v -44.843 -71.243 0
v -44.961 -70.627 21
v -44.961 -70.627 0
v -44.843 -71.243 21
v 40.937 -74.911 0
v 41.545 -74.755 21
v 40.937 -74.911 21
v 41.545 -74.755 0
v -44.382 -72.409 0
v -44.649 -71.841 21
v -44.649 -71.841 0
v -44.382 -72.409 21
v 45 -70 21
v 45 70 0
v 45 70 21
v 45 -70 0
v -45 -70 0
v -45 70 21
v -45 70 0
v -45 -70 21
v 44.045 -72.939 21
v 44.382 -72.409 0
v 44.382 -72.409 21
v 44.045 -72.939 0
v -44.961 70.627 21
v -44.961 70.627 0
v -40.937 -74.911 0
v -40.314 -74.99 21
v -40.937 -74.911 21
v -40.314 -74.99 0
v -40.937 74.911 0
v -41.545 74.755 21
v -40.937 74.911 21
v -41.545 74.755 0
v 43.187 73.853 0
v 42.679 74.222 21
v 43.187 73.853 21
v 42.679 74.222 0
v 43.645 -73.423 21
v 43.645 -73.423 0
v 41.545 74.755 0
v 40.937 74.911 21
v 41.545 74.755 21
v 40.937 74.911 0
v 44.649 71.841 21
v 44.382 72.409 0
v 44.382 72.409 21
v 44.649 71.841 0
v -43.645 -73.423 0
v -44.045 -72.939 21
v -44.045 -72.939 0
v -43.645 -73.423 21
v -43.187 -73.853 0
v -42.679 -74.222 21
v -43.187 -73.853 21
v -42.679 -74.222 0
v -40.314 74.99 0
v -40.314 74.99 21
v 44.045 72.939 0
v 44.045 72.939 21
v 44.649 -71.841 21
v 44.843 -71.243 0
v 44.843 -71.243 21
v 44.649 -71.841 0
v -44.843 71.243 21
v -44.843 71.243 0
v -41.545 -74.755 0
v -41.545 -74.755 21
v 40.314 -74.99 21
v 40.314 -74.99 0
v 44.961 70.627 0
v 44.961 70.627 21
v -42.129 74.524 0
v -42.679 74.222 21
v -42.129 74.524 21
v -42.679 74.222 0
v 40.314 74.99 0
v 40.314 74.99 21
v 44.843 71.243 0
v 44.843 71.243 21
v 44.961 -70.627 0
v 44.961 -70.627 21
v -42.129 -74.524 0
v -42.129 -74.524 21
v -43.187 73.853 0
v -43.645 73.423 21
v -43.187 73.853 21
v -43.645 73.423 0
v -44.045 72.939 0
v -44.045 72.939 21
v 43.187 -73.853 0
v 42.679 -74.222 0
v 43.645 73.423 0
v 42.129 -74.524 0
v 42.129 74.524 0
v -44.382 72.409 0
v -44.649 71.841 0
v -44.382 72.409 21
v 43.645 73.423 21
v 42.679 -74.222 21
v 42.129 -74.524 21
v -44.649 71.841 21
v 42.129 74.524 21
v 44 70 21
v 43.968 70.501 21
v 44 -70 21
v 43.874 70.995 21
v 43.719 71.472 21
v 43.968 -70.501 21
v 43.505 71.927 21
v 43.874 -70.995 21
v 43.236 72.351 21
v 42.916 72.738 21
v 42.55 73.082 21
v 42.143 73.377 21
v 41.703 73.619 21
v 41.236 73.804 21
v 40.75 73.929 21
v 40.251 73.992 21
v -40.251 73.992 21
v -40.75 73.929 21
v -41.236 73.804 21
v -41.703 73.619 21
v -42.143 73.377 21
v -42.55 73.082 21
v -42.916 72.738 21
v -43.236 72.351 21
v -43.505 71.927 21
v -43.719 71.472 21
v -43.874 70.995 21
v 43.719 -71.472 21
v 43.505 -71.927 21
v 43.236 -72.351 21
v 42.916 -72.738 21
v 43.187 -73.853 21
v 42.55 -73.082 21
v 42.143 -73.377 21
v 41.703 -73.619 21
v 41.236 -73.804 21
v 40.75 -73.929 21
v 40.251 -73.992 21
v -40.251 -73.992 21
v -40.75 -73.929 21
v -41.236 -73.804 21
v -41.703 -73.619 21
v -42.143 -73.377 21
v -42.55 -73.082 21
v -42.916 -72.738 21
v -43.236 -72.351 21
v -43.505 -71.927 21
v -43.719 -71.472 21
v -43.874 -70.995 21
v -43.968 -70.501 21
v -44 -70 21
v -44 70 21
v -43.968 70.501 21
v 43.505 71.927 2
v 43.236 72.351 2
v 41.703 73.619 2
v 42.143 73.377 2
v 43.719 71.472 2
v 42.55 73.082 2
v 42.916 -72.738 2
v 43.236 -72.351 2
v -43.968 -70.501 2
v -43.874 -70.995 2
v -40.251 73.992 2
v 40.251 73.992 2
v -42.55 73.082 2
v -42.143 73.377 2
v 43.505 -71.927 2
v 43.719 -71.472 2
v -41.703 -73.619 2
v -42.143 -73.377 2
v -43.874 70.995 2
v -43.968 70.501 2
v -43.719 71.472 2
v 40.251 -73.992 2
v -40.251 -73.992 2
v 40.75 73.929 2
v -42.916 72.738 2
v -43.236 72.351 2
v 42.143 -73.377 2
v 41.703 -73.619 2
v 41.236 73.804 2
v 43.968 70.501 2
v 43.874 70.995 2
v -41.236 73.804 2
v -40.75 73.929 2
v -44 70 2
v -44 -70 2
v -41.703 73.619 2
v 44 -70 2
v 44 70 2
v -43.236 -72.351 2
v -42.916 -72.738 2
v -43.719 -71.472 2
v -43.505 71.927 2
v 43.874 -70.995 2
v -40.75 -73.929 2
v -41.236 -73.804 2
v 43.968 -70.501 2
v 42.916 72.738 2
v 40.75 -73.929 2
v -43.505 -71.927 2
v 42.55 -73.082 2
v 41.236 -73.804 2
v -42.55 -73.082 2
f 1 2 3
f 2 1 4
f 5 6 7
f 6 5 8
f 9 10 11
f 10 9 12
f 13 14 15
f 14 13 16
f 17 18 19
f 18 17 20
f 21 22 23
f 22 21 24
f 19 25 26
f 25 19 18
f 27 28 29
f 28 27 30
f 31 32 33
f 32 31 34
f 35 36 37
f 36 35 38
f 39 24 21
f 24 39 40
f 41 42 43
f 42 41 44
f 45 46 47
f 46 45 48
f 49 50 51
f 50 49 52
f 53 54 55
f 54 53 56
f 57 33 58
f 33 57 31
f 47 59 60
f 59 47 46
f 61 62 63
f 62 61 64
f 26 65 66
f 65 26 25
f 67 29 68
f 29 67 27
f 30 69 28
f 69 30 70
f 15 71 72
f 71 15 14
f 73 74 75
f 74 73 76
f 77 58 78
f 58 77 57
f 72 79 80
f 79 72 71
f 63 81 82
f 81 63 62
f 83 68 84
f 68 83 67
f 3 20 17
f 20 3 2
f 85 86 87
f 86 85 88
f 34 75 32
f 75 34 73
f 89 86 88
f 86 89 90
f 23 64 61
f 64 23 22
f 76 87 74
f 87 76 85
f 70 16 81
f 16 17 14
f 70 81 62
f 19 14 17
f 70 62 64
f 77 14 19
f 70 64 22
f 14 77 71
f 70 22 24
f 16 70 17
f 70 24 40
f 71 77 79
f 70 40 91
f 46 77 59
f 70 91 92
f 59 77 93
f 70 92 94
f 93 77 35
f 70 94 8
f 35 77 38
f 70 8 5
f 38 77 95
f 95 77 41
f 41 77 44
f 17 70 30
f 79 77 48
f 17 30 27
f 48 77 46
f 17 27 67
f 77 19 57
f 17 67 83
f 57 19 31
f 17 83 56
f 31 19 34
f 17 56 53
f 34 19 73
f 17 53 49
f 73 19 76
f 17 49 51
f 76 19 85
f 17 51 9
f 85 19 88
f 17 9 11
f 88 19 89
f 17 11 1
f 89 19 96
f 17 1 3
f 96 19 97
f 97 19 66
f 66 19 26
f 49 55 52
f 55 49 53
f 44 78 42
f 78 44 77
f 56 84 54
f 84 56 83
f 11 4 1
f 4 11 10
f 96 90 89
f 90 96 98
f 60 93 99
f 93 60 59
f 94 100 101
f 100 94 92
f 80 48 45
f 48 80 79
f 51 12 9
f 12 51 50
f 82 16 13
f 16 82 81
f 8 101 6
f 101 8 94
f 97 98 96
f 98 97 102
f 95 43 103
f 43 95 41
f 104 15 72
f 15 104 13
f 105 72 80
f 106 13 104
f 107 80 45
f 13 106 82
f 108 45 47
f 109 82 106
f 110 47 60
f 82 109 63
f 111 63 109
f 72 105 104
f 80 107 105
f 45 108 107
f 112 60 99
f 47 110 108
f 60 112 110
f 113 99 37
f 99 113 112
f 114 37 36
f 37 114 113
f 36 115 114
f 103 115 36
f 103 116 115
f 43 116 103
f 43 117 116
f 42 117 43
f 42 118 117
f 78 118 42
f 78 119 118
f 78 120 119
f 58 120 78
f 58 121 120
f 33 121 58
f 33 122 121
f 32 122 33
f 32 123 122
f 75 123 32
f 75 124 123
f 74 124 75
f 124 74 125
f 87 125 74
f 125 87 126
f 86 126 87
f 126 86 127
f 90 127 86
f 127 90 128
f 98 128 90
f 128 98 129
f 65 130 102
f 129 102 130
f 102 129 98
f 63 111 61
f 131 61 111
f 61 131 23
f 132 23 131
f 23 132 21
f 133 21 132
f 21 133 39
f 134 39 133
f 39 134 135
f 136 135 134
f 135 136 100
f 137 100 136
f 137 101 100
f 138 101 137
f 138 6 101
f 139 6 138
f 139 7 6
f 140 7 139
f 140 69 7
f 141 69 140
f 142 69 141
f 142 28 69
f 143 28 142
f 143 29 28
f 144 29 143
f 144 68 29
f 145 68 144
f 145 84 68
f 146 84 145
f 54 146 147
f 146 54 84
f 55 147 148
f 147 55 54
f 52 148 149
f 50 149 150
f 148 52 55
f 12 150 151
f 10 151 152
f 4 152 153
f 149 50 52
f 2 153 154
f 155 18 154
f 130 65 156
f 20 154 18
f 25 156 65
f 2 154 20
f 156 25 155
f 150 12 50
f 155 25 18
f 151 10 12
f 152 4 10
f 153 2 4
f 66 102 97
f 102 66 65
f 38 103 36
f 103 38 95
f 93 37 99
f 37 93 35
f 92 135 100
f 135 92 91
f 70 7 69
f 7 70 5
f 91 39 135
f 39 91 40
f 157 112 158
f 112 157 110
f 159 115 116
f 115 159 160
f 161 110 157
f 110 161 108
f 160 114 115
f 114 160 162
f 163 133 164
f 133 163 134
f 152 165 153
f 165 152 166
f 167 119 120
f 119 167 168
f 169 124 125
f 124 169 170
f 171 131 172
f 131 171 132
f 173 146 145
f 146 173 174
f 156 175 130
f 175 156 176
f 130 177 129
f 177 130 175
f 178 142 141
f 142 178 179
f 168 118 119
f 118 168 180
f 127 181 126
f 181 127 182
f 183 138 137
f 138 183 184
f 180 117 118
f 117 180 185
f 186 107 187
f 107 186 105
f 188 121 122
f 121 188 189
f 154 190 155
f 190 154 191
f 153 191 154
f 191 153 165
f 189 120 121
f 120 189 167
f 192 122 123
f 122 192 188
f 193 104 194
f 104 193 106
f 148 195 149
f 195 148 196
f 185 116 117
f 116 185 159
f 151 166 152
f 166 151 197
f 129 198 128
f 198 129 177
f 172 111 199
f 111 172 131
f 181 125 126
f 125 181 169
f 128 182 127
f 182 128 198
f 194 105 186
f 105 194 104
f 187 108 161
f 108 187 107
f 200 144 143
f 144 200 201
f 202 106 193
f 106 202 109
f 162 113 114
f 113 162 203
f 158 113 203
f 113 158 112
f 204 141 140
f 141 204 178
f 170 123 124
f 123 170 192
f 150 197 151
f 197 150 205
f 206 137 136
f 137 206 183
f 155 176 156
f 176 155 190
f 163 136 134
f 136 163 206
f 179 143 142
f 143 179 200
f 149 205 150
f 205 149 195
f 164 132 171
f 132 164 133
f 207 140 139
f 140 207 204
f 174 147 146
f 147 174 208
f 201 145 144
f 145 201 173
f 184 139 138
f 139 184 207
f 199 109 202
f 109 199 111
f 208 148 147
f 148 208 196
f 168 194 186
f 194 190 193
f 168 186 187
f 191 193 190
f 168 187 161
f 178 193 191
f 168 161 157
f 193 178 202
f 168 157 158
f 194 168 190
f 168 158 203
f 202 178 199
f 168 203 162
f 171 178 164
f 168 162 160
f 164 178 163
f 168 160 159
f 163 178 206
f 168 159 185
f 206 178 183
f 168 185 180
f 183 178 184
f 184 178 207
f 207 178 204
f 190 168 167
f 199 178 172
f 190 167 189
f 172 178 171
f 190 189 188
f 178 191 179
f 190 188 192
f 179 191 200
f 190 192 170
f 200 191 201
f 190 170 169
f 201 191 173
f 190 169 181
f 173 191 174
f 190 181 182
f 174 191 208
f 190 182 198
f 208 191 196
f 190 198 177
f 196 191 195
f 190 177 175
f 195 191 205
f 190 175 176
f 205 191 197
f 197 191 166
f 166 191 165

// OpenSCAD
$fn = 50;


difference() {
	union() {
		hull() {
			translate(v = [-40.0000000000, 70.0000000000, 0]) {
				cylinder(h = 21, r = 5);
			}
			translate(v = [40.0000000000, 70.0000000000, 0]) {
				cylinder(h = 21, r = 5);
			}
			translate(v = [-40.0000000000, -70.0000000000, 0]) {
				cylinder(h = 21, r = 5);
			}
			translate(v = [40.0000000000, -70.0000000000, 0]) {
				cylinder(h = 21, r = 5);
			}
		}
	}
	union() {
		translate(v = [0, 0, 2]) {
			hull() {
				translate(v = [-40.0000000000, 70.0000000000, 0]) {
					cylinder(h = 19, r = 4);
				}
				translate(v = [40.0000000000, 70.0000000000, 0]) {
					cylinder(h = 19, r = 4);
				}
				translate(v = [-40.0000000000, -70.0000000000, 0]) {
					cylinder(h = 19, r = 4);
				}
				translate(v = [40.0000000000, -70.0000000000, 0]) {
					cylinder(h = 19, r = 4);
				}
			}
		}
	}
}
